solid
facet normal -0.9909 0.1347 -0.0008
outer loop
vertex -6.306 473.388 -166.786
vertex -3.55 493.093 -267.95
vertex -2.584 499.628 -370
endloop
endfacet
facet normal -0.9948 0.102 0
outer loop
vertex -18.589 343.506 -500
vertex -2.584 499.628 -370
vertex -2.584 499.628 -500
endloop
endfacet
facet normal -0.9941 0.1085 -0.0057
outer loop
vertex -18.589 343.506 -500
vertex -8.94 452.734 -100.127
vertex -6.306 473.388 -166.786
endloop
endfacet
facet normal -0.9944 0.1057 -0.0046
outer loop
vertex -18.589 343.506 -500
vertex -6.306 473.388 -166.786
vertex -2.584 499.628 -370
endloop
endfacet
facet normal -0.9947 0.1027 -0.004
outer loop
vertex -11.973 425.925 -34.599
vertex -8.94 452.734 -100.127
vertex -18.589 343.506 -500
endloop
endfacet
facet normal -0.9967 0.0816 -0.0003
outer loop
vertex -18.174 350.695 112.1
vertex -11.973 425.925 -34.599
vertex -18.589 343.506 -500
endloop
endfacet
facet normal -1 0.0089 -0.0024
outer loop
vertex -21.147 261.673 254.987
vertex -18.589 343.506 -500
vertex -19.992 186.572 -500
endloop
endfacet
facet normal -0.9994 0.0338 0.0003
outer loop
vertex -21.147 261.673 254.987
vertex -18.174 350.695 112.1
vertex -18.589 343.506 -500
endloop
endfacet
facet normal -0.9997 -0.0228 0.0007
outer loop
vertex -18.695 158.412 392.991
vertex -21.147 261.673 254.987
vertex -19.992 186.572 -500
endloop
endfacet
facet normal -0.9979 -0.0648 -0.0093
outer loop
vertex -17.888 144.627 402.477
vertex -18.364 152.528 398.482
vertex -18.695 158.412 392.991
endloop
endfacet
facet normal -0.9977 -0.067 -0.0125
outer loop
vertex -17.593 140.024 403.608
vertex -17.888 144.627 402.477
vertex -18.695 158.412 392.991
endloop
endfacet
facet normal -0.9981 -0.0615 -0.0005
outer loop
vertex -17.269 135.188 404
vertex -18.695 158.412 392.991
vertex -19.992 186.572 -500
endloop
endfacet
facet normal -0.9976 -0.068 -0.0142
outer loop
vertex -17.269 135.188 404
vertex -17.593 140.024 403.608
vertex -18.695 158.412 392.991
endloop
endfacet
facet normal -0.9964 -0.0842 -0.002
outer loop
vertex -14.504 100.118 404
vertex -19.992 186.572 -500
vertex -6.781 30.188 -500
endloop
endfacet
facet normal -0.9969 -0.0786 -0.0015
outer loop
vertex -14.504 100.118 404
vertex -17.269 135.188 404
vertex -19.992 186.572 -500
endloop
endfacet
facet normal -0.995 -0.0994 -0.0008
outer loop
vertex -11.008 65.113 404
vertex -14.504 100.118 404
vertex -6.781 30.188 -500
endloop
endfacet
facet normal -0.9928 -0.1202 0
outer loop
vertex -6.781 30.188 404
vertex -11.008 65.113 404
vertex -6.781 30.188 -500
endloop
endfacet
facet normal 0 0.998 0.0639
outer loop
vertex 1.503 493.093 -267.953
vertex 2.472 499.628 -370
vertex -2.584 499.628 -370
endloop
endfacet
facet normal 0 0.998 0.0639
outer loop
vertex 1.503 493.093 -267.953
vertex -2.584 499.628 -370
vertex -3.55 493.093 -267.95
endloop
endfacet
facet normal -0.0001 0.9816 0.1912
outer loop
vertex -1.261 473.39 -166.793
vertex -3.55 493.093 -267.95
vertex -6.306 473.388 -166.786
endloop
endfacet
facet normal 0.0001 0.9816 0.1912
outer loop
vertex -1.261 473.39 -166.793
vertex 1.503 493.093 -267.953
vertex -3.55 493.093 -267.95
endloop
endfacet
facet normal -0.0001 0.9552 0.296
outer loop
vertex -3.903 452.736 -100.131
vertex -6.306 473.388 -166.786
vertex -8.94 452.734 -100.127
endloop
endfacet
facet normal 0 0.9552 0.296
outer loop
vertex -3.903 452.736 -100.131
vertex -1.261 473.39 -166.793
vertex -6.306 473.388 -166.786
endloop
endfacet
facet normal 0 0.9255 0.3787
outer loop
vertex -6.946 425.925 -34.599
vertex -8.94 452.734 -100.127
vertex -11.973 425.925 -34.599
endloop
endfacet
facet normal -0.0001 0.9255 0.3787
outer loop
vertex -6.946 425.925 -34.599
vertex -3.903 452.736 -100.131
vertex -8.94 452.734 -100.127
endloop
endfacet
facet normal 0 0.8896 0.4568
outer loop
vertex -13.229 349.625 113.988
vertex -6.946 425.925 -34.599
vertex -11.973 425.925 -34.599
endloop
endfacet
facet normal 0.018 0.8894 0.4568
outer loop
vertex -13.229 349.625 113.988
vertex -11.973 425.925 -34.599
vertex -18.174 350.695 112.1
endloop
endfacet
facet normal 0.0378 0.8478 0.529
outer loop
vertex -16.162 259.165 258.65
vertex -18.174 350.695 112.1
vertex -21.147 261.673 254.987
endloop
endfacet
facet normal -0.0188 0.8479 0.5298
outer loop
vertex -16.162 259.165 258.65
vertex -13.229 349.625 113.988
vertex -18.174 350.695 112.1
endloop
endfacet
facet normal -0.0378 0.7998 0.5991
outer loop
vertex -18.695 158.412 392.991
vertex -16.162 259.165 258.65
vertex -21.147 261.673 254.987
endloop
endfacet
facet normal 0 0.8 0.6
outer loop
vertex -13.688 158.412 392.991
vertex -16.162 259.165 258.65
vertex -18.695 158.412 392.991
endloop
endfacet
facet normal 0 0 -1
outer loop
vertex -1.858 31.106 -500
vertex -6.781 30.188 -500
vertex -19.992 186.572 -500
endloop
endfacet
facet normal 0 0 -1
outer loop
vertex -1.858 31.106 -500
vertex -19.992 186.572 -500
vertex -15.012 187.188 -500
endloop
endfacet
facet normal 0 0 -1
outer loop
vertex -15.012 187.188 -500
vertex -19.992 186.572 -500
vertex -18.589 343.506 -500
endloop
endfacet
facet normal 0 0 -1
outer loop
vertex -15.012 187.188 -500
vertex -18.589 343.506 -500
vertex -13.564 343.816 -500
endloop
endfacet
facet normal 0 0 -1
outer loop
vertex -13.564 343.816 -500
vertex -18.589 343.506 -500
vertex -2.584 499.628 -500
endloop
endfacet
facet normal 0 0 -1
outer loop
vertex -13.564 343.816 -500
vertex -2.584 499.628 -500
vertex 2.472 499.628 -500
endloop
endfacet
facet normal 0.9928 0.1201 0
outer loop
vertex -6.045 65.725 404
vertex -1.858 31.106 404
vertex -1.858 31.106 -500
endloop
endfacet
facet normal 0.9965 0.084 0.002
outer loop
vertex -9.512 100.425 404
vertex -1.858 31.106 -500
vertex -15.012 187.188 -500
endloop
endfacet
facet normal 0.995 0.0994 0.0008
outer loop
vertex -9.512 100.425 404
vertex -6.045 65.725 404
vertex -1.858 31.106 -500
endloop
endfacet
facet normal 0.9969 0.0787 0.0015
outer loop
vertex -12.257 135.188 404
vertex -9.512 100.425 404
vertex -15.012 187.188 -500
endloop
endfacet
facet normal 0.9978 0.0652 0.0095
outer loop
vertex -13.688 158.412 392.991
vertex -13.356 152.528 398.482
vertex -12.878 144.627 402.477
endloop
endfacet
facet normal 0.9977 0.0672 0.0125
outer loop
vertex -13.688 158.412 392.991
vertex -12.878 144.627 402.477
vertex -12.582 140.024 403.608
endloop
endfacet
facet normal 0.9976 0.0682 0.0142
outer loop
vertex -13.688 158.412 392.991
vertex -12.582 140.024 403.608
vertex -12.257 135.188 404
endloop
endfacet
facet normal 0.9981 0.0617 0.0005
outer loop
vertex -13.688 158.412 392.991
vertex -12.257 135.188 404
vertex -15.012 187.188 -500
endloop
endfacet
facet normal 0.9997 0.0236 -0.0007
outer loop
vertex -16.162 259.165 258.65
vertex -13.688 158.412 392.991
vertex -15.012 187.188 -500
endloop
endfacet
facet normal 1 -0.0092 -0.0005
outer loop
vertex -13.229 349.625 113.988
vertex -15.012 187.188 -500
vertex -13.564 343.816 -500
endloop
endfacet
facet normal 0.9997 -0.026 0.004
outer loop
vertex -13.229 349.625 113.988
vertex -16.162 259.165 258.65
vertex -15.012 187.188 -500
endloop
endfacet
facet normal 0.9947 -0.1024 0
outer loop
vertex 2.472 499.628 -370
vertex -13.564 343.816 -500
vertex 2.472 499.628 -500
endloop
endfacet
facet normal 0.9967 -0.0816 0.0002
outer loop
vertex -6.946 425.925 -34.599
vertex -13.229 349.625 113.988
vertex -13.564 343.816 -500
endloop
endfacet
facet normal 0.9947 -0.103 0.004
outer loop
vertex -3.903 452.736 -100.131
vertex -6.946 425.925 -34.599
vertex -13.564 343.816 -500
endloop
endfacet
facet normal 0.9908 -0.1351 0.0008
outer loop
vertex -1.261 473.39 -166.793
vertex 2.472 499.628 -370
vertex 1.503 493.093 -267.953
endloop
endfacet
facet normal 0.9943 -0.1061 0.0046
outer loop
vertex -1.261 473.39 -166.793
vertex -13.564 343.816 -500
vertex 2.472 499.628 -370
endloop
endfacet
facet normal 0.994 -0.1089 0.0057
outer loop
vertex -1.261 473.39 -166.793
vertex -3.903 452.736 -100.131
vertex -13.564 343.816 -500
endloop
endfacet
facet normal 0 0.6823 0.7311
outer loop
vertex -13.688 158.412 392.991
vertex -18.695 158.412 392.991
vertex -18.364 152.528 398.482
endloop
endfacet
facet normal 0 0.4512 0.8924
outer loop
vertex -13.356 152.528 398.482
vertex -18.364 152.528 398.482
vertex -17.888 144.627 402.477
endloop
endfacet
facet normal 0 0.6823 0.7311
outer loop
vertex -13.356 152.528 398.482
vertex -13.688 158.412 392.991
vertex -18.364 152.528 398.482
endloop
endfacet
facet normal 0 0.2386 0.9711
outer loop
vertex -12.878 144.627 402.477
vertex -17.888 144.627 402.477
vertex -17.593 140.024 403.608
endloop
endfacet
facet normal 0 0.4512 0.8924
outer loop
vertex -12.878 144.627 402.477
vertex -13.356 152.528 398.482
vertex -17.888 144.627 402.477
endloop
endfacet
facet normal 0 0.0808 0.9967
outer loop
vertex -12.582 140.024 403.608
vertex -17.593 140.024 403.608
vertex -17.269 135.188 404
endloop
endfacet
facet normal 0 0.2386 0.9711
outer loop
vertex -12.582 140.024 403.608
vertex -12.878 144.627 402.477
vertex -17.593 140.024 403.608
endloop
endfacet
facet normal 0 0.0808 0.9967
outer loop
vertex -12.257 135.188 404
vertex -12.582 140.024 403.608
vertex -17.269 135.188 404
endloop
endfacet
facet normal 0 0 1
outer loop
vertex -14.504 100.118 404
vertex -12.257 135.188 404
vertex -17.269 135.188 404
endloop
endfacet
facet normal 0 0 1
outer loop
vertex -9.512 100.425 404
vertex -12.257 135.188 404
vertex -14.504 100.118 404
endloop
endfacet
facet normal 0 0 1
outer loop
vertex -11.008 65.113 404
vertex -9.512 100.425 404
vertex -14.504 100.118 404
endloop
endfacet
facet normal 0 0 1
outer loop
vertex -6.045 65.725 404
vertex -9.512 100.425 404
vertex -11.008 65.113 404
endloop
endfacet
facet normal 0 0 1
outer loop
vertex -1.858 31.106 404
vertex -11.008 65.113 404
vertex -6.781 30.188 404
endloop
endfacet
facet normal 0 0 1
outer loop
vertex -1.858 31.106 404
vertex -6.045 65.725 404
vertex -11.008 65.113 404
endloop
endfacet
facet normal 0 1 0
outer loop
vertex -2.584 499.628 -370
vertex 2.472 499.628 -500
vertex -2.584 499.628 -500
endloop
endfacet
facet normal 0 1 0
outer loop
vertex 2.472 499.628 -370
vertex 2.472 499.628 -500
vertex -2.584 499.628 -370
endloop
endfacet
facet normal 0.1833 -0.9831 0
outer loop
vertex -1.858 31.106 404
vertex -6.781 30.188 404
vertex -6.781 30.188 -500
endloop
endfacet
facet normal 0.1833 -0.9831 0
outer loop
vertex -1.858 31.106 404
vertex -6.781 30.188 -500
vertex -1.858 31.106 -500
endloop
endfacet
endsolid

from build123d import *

# Parameters (mm, degrees)
EXTRUDE_THIN1_DEPTH = 500
SKETCH2_OUTSIDE_W   = 1225.724
SKETCH2_OUTSIDE_H   = 726.468
CUT_EXTRUDE1_DEPTH  = 40
CUT_EXTRUDE2_DEPTH  = 905.0000001


with BuildPart() as part:
    # Sketch1 → Extrude-Thin1 (new body, symmetric)
    with BuildSketch(Plane.XY):
        with BuildLine():
            ThreePointArc((2.472217938, 0.371669838), (-16.187326406, 250), (2.472217938, 499.628330162))
            Line((2.472217938, 499.628330162), (-2.472217938, 500.371669838))
            ThreePointArc((-2.472217938, 500.371669838), (-21.187326406, 250), (-2.472217938, -0.371669838))
            Line((-2.472217938, -0.371669838), (2.472217938, 0.371669838))
        make_face()
    extrude(amount=EXTRUDE_THIN1_DEPTH, both=True)

    # Sketch2 outside → Cut-Extrude1 (cut, symmetric)
    with BuildSketch(Plane(origin=(0, 0, 0), x_dir=(0, 0, -1), z_dir=(1, 0, 0))):
        with Locations((0, 250)):
            Rectangle(SKETCH2_OUTSIDE_W, SKETCH2_OUTSIDE_H)
        with BuildLine():
            Line((500, 499.628330162), (370, 499.628330162))
            ThreePointArc((370, 499.628330162), (198.298251655, 480.98516901), (34.59916172, 425.9246042))
            ThreePointArc((34.59916172, 425.9246042), (-187.662872816, 305.701379942), (-392.991389707, 158.411747589))
            ThreePointArc((-392.991389707, 158.411747589), (-401.108501353, 148.038589085), (-404, 135.188330162))
            Line((-404, 135.188330162), (-404, 30.188330162))
            Line((-404, 30.188330162), (500, 30.188330162))
            Line((500, 30.188330162), (500, 499.628330162))
        make_face(mode=Mode.SUBTRACT)
    extrude(amount=CUT_EXTRUDE1_DEPTH, both=True, mode=Mode.SUBTRACT)

    # Sketch3 → Cut-Extrude2 (cut, through all)
    with BuildSketch(Plane.XY.offset(404)):
        Polygon((-6.780603569, 30.188330162), (-1.858216297, 31.105746602), (-1.737331603, 30.188330162), align=None)
    extrude(amount=-CUT_EXTRUDE2_DEPTH, mode=Mode.SUBTRACT)


solid = part.part
